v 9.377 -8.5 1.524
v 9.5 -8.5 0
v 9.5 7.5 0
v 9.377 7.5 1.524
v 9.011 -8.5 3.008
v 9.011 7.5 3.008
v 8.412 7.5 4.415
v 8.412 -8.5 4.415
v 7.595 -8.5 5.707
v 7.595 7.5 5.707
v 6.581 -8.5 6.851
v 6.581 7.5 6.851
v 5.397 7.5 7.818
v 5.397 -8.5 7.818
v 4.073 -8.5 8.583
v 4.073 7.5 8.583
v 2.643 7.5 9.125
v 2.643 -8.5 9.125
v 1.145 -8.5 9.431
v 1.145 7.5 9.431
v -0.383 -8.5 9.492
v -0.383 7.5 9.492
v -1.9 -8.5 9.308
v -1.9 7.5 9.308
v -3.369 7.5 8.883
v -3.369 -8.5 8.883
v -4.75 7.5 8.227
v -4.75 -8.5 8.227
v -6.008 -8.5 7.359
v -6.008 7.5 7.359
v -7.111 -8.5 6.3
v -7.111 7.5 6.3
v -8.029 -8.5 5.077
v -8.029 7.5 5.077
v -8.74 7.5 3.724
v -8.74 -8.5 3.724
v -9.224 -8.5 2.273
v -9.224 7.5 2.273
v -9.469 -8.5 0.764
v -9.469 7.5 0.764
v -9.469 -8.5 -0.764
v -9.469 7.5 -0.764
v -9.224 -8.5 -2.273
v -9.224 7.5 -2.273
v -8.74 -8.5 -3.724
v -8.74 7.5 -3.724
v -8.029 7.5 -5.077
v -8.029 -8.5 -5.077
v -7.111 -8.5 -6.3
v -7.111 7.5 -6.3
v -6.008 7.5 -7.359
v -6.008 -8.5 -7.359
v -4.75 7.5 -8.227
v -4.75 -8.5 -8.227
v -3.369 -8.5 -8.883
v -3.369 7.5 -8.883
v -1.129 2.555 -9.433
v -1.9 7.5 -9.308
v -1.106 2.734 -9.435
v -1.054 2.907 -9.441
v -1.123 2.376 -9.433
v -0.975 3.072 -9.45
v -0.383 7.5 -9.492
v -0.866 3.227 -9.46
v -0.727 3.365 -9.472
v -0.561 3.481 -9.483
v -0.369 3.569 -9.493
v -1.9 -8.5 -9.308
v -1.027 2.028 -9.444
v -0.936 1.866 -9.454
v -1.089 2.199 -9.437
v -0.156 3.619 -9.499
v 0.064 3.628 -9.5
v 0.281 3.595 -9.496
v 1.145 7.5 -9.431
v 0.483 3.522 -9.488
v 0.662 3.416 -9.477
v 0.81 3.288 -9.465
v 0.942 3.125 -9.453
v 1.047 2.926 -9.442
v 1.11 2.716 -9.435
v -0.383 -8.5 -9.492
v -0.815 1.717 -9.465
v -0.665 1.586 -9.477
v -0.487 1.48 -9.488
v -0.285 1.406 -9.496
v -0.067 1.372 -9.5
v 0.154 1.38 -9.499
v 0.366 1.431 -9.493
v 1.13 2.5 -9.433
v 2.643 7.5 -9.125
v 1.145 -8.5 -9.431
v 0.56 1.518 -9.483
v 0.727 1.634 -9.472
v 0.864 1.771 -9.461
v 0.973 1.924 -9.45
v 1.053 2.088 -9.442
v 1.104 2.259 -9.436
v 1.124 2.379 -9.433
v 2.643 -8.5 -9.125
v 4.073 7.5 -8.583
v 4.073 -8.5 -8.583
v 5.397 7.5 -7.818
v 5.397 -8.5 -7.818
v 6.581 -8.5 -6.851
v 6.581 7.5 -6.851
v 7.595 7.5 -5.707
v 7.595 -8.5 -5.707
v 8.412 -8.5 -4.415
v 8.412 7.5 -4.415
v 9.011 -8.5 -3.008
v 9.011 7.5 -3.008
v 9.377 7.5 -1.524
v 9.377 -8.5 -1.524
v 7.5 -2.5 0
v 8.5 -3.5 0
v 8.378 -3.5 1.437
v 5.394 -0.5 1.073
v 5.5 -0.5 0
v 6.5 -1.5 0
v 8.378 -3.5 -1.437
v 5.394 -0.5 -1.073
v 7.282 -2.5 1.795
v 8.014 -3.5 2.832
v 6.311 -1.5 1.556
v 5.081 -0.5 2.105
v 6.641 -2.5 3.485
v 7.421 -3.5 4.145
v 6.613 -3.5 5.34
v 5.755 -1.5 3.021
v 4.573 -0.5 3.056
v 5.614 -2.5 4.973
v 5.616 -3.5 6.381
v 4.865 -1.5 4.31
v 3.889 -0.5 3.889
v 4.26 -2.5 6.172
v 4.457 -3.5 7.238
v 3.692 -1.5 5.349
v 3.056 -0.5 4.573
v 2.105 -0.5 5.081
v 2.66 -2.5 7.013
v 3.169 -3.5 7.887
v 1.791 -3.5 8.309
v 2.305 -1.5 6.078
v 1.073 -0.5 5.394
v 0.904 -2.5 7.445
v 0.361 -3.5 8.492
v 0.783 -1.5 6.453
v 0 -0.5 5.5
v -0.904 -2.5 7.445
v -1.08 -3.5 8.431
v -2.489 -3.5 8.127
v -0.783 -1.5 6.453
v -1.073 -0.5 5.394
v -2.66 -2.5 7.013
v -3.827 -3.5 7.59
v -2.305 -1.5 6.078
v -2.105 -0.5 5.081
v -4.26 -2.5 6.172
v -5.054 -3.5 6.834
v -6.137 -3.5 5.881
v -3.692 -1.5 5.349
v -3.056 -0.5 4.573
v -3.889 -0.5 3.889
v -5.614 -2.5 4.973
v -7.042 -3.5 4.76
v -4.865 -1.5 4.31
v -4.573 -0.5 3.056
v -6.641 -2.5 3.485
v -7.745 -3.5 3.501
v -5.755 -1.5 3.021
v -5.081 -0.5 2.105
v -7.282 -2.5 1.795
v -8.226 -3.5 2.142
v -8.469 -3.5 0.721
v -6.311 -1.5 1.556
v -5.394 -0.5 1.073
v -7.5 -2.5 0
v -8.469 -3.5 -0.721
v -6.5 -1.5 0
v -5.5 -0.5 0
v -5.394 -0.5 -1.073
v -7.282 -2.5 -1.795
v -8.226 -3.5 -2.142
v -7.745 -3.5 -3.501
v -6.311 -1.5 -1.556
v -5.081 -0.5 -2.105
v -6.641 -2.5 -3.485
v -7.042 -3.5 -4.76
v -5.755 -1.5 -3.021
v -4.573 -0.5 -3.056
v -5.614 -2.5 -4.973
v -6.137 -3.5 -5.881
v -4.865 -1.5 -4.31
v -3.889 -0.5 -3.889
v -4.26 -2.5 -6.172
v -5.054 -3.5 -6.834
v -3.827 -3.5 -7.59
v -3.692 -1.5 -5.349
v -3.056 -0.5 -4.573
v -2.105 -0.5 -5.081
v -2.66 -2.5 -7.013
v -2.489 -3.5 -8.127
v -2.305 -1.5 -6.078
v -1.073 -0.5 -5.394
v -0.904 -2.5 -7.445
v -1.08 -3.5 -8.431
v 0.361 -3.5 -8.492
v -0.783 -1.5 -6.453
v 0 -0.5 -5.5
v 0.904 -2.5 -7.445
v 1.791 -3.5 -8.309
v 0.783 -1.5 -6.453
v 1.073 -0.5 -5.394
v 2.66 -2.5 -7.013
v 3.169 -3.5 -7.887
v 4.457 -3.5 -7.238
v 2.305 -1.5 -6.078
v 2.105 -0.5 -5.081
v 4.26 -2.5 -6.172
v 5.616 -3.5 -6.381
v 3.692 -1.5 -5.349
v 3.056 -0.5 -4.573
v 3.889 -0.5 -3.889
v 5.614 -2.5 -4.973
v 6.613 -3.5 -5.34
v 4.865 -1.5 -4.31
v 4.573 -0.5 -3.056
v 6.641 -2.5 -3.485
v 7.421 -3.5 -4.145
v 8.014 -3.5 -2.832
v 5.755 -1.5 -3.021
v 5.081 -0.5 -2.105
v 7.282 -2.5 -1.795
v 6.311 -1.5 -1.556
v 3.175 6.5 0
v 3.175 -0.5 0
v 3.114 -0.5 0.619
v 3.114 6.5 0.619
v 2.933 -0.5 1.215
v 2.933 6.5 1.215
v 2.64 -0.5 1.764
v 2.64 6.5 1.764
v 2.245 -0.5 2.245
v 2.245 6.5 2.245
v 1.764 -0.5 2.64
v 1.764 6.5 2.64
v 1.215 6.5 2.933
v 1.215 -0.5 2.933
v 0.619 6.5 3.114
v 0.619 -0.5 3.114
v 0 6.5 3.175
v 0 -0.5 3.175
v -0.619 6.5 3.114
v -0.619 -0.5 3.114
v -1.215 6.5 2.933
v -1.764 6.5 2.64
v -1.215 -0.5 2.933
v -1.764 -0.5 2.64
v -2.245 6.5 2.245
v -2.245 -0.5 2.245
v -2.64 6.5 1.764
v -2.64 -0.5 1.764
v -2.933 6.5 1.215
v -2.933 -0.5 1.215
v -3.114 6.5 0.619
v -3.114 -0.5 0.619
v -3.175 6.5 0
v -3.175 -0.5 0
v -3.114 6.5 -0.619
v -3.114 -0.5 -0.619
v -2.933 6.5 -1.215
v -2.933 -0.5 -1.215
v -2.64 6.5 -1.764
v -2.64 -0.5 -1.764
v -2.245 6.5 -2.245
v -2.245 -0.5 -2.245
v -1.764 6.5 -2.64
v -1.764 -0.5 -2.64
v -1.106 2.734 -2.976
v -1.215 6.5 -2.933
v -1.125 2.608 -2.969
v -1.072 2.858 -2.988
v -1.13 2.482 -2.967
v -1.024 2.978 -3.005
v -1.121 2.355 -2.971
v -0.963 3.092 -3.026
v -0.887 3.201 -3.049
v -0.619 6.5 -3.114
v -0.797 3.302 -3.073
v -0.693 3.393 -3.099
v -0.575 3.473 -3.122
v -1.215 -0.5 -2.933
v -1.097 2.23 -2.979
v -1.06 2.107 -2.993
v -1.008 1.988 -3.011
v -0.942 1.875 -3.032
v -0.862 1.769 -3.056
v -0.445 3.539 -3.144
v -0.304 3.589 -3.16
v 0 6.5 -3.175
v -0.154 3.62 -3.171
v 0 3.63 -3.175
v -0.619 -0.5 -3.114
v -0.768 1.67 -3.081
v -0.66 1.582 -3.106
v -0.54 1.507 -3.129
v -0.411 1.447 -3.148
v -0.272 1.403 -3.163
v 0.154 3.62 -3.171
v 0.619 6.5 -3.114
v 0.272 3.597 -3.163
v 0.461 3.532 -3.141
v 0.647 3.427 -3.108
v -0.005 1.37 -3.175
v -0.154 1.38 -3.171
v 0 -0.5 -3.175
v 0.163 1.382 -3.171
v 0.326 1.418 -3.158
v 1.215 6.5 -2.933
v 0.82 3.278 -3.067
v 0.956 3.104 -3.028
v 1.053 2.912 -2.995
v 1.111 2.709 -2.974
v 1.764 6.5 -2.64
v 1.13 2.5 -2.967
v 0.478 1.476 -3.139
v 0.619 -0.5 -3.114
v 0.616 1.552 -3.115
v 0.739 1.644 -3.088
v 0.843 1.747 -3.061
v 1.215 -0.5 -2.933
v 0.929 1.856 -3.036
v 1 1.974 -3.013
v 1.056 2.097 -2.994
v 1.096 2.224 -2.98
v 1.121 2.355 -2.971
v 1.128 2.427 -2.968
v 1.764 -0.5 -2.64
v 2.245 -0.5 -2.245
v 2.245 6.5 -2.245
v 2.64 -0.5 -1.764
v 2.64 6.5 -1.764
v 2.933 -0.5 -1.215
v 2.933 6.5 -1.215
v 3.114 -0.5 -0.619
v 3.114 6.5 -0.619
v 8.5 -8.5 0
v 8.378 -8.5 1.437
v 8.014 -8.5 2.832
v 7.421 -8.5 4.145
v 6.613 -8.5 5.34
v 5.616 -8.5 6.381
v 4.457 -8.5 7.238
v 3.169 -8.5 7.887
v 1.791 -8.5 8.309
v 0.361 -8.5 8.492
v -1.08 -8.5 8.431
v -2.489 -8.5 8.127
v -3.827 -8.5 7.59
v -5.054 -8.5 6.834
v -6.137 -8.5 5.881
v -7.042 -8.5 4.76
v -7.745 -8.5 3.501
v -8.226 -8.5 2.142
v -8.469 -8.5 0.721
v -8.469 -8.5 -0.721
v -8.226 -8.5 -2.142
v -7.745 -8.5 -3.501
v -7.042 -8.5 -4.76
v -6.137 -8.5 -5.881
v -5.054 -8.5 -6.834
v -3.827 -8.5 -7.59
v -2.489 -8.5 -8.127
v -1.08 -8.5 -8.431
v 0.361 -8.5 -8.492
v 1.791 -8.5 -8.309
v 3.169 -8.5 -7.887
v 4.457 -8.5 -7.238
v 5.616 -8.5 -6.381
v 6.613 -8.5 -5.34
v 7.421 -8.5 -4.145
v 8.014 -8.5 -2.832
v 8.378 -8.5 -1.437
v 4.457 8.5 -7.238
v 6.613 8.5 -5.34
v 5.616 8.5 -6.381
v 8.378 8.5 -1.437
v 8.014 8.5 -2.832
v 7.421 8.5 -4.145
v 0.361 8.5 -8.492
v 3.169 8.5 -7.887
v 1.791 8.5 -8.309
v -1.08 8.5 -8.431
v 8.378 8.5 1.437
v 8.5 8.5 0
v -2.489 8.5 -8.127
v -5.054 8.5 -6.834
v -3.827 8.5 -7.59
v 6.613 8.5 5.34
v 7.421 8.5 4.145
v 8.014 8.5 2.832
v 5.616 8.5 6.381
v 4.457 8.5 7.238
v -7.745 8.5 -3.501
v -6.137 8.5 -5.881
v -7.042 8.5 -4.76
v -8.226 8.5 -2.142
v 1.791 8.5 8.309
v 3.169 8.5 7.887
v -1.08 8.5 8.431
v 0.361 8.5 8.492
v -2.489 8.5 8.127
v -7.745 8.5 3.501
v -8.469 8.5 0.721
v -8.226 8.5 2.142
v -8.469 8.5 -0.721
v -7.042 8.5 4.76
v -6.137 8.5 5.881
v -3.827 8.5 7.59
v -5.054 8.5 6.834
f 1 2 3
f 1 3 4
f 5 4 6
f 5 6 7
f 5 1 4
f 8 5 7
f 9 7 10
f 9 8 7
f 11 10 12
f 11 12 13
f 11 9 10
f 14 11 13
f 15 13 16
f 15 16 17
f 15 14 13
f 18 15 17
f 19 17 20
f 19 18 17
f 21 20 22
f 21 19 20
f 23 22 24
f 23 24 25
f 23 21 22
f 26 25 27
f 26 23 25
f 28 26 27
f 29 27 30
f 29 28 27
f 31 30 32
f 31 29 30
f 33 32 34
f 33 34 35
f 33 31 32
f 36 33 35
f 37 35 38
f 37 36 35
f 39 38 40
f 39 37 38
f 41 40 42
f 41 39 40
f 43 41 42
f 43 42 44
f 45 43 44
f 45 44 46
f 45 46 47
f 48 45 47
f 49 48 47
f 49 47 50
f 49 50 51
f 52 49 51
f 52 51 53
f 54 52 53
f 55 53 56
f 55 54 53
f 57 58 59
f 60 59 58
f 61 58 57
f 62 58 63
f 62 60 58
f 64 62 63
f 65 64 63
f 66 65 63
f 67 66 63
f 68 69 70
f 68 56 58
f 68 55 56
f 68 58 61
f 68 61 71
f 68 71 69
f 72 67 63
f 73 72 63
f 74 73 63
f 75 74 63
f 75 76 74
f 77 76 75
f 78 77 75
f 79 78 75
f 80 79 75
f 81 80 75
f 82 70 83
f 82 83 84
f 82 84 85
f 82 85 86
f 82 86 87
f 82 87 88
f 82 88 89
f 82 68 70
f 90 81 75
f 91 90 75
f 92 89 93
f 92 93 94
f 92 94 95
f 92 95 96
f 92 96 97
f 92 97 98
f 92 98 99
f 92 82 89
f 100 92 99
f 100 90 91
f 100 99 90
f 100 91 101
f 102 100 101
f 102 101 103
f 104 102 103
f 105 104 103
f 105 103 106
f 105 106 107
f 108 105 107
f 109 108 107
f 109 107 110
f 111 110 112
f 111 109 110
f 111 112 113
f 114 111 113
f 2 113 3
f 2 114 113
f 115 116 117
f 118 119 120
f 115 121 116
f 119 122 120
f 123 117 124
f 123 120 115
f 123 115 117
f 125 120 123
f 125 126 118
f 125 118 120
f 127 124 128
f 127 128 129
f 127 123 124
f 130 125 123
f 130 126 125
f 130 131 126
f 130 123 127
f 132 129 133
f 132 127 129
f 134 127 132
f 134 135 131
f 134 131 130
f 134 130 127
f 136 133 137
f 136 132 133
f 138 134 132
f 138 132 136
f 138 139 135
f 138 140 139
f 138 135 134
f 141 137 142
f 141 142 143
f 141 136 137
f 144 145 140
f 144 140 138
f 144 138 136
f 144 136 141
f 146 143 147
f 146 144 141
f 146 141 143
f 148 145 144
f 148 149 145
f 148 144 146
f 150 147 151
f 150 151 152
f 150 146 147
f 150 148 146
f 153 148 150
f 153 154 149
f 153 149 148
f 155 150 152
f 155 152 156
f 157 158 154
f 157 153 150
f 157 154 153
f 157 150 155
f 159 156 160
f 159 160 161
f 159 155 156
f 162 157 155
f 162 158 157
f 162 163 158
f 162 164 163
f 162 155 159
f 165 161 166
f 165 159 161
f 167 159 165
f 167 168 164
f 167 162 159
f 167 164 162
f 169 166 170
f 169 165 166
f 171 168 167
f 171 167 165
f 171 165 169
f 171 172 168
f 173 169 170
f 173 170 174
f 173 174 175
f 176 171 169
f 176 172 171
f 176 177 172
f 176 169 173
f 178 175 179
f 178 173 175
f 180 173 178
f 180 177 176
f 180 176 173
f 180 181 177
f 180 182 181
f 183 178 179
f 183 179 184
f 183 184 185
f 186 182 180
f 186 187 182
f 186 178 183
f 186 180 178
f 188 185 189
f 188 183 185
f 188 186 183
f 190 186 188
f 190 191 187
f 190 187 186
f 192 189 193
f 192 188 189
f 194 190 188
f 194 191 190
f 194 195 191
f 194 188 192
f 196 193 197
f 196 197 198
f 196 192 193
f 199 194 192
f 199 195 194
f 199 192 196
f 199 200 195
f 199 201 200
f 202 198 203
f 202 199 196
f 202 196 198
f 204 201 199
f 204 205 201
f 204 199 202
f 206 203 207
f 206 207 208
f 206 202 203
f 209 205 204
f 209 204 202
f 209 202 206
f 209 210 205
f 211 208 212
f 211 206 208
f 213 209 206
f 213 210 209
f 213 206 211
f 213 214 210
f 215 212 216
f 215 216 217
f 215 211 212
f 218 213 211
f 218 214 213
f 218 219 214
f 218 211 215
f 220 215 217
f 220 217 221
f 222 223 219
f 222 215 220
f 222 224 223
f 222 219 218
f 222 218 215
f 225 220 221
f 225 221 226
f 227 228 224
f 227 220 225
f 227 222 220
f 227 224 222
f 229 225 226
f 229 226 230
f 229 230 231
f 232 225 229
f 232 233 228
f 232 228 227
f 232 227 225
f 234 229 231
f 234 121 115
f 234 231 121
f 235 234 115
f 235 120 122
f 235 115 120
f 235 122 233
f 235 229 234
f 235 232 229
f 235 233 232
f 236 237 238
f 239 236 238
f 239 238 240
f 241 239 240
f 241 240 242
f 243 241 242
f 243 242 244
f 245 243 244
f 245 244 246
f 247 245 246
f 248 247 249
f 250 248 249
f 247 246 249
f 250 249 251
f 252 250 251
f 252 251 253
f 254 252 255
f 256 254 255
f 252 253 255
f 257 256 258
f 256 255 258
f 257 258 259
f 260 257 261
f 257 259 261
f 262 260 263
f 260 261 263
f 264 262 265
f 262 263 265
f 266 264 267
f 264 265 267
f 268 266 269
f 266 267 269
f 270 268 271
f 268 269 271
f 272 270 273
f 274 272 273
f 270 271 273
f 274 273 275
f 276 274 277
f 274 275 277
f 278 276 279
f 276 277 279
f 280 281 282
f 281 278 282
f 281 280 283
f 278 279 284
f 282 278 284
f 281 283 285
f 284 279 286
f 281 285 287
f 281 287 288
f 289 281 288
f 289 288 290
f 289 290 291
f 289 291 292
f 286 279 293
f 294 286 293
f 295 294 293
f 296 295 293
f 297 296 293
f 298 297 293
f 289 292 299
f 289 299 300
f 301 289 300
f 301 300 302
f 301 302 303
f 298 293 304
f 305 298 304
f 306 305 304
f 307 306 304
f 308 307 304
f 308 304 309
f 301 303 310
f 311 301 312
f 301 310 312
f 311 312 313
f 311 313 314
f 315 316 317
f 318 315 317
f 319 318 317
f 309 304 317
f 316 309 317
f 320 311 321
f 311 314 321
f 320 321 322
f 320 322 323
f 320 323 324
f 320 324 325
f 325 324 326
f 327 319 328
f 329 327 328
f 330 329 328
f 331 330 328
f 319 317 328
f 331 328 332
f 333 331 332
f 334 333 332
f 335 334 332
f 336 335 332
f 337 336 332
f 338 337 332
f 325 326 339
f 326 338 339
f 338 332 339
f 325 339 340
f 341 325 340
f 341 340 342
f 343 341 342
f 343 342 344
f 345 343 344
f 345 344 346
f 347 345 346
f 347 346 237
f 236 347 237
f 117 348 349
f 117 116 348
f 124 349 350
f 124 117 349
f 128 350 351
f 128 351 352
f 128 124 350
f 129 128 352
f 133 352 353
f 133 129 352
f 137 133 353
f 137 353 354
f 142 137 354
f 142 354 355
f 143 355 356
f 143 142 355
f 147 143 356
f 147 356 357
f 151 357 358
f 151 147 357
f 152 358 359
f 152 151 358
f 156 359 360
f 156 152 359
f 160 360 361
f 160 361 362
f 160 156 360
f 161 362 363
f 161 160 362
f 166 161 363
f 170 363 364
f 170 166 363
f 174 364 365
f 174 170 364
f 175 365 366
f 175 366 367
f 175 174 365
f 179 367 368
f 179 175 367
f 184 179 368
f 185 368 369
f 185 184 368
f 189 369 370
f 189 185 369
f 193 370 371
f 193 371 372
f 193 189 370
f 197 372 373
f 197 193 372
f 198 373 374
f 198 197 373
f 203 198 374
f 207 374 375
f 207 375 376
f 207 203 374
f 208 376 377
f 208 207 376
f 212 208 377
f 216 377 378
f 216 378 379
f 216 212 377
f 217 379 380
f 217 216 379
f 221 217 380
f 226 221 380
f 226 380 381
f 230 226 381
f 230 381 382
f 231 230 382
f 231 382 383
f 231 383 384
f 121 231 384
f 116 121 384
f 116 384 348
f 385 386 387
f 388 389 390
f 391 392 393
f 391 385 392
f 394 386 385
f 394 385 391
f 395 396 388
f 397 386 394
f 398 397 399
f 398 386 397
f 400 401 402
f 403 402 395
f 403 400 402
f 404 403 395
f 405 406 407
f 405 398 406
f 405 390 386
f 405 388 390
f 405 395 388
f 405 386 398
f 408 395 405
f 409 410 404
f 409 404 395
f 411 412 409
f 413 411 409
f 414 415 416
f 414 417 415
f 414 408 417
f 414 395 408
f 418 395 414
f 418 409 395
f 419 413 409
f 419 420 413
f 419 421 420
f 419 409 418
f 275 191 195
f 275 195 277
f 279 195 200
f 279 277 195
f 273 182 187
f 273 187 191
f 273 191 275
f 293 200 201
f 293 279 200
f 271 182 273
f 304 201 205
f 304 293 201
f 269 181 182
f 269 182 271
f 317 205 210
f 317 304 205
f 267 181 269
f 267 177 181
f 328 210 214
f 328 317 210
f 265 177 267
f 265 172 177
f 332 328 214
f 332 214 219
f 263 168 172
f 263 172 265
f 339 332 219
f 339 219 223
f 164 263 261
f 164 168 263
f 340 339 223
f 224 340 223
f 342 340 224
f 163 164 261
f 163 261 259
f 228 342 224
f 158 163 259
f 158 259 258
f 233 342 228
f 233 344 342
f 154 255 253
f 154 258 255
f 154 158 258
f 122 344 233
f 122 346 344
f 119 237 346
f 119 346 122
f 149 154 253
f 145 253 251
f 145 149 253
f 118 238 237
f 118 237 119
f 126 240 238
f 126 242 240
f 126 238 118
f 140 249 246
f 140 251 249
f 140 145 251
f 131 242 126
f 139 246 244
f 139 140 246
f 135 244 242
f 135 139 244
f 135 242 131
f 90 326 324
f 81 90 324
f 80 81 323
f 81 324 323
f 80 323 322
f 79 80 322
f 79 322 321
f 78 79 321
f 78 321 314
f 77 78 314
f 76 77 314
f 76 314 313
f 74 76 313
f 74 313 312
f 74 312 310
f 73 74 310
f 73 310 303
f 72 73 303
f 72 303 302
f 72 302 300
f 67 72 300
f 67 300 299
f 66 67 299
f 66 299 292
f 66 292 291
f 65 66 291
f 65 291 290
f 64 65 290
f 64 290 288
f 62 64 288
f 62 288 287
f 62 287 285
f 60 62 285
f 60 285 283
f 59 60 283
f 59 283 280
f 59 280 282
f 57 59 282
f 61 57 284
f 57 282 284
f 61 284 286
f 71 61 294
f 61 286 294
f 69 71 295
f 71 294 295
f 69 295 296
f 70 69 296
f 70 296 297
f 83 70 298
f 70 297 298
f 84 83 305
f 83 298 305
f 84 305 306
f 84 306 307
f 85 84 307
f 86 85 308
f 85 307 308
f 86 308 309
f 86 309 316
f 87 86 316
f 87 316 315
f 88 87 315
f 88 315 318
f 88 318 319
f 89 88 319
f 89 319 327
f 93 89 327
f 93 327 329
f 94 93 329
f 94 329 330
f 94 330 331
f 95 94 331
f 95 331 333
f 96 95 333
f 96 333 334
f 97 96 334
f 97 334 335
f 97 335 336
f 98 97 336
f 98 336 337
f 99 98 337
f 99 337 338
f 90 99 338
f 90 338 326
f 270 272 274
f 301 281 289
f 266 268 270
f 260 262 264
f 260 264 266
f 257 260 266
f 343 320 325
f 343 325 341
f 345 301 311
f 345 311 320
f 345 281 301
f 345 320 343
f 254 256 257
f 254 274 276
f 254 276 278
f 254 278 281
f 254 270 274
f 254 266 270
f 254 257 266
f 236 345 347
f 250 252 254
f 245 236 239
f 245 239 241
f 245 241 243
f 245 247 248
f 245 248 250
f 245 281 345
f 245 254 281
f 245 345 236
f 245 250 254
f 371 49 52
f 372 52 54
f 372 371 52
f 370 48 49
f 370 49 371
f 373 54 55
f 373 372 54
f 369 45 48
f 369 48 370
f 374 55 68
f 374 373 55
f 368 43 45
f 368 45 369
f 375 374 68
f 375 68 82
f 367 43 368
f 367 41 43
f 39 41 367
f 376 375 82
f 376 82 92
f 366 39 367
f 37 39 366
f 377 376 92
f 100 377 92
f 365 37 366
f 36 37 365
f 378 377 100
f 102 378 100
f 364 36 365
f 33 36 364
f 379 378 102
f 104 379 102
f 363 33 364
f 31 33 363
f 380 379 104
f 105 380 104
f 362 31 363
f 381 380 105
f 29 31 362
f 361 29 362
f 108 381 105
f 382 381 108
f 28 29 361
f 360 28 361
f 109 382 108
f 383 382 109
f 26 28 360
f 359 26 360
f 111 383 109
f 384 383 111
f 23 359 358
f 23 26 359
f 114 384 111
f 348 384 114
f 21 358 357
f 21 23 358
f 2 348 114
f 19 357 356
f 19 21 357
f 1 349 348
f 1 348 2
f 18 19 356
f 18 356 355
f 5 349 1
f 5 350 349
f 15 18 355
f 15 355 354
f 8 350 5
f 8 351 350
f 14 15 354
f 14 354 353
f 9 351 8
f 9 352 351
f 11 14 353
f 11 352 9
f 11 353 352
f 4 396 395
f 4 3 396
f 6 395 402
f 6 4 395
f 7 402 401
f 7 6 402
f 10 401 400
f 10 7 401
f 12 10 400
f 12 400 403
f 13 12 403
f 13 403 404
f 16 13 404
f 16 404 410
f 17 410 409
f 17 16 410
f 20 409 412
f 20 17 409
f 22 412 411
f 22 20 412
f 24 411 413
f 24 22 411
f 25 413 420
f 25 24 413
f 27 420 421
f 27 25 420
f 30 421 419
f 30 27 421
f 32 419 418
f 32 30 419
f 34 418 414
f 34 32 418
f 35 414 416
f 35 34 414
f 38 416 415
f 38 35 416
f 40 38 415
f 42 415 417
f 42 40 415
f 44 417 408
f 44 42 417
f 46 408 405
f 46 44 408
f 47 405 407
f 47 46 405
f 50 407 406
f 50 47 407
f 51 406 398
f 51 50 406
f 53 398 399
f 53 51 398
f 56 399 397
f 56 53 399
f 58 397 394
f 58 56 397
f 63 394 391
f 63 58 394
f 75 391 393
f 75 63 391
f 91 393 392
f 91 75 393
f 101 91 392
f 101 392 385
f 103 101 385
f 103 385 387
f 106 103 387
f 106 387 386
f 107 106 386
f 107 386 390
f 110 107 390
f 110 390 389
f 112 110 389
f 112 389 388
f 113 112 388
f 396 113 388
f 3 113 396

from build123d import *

# Parameters (mm, degrees)
SKETCH2_R          = 3.175
CUT_EXTRUDE1_DEPTH = 7
CUT_EXTRUDE2_REACH = 11.5
SKETCH3_R          = 1.1303


with BuildPart() as part:
    # Sketch1 → Revolve1 (revolve)
    with BuildSketch(Plane.XY):
        Polygon((0, 8.5), (8.5, 8.5), (9.5, 7.5), (9.5, -8.5), (8.5, -8.5), (8.5, -3.5), (5.5, -0.5), (0, -0.5), align=None)
    revolve(axis=Axis((0, 8.5, 0), (0, -1, 0)))

    # Sketch2 → Cut-Extrude1 (cut)
    with BuildSketch(Plane.XZ.offset(0.5)):
        Circle(SKETCH2_R)
    extrude(amount=-CUT_EXTRUDE1_DEPTH, mode=Mode.SUBTRACT)

    # Sketch3 → Cut-Extrude2 (cut, up to next)
    with BuildSketch(Plane.XY, mode=Mode.PRIVATE) as cut_extrude2_sk1:
        with Locations((0, 2.5)):
            Circle(SKETCH3_R)
    cut_extrude2_tool1 = extrude(cut_extrude2_sk1.sketch, amount=-CUT_EXTRUDE2_REACH, mode=Mode.PRIVATE) & part.part
    add(cut_extrude2_tool1.solids().sort_by_distance((0, 2.5, 0))[0], mode=Mode.SUBTRACT)


solid = part.part
